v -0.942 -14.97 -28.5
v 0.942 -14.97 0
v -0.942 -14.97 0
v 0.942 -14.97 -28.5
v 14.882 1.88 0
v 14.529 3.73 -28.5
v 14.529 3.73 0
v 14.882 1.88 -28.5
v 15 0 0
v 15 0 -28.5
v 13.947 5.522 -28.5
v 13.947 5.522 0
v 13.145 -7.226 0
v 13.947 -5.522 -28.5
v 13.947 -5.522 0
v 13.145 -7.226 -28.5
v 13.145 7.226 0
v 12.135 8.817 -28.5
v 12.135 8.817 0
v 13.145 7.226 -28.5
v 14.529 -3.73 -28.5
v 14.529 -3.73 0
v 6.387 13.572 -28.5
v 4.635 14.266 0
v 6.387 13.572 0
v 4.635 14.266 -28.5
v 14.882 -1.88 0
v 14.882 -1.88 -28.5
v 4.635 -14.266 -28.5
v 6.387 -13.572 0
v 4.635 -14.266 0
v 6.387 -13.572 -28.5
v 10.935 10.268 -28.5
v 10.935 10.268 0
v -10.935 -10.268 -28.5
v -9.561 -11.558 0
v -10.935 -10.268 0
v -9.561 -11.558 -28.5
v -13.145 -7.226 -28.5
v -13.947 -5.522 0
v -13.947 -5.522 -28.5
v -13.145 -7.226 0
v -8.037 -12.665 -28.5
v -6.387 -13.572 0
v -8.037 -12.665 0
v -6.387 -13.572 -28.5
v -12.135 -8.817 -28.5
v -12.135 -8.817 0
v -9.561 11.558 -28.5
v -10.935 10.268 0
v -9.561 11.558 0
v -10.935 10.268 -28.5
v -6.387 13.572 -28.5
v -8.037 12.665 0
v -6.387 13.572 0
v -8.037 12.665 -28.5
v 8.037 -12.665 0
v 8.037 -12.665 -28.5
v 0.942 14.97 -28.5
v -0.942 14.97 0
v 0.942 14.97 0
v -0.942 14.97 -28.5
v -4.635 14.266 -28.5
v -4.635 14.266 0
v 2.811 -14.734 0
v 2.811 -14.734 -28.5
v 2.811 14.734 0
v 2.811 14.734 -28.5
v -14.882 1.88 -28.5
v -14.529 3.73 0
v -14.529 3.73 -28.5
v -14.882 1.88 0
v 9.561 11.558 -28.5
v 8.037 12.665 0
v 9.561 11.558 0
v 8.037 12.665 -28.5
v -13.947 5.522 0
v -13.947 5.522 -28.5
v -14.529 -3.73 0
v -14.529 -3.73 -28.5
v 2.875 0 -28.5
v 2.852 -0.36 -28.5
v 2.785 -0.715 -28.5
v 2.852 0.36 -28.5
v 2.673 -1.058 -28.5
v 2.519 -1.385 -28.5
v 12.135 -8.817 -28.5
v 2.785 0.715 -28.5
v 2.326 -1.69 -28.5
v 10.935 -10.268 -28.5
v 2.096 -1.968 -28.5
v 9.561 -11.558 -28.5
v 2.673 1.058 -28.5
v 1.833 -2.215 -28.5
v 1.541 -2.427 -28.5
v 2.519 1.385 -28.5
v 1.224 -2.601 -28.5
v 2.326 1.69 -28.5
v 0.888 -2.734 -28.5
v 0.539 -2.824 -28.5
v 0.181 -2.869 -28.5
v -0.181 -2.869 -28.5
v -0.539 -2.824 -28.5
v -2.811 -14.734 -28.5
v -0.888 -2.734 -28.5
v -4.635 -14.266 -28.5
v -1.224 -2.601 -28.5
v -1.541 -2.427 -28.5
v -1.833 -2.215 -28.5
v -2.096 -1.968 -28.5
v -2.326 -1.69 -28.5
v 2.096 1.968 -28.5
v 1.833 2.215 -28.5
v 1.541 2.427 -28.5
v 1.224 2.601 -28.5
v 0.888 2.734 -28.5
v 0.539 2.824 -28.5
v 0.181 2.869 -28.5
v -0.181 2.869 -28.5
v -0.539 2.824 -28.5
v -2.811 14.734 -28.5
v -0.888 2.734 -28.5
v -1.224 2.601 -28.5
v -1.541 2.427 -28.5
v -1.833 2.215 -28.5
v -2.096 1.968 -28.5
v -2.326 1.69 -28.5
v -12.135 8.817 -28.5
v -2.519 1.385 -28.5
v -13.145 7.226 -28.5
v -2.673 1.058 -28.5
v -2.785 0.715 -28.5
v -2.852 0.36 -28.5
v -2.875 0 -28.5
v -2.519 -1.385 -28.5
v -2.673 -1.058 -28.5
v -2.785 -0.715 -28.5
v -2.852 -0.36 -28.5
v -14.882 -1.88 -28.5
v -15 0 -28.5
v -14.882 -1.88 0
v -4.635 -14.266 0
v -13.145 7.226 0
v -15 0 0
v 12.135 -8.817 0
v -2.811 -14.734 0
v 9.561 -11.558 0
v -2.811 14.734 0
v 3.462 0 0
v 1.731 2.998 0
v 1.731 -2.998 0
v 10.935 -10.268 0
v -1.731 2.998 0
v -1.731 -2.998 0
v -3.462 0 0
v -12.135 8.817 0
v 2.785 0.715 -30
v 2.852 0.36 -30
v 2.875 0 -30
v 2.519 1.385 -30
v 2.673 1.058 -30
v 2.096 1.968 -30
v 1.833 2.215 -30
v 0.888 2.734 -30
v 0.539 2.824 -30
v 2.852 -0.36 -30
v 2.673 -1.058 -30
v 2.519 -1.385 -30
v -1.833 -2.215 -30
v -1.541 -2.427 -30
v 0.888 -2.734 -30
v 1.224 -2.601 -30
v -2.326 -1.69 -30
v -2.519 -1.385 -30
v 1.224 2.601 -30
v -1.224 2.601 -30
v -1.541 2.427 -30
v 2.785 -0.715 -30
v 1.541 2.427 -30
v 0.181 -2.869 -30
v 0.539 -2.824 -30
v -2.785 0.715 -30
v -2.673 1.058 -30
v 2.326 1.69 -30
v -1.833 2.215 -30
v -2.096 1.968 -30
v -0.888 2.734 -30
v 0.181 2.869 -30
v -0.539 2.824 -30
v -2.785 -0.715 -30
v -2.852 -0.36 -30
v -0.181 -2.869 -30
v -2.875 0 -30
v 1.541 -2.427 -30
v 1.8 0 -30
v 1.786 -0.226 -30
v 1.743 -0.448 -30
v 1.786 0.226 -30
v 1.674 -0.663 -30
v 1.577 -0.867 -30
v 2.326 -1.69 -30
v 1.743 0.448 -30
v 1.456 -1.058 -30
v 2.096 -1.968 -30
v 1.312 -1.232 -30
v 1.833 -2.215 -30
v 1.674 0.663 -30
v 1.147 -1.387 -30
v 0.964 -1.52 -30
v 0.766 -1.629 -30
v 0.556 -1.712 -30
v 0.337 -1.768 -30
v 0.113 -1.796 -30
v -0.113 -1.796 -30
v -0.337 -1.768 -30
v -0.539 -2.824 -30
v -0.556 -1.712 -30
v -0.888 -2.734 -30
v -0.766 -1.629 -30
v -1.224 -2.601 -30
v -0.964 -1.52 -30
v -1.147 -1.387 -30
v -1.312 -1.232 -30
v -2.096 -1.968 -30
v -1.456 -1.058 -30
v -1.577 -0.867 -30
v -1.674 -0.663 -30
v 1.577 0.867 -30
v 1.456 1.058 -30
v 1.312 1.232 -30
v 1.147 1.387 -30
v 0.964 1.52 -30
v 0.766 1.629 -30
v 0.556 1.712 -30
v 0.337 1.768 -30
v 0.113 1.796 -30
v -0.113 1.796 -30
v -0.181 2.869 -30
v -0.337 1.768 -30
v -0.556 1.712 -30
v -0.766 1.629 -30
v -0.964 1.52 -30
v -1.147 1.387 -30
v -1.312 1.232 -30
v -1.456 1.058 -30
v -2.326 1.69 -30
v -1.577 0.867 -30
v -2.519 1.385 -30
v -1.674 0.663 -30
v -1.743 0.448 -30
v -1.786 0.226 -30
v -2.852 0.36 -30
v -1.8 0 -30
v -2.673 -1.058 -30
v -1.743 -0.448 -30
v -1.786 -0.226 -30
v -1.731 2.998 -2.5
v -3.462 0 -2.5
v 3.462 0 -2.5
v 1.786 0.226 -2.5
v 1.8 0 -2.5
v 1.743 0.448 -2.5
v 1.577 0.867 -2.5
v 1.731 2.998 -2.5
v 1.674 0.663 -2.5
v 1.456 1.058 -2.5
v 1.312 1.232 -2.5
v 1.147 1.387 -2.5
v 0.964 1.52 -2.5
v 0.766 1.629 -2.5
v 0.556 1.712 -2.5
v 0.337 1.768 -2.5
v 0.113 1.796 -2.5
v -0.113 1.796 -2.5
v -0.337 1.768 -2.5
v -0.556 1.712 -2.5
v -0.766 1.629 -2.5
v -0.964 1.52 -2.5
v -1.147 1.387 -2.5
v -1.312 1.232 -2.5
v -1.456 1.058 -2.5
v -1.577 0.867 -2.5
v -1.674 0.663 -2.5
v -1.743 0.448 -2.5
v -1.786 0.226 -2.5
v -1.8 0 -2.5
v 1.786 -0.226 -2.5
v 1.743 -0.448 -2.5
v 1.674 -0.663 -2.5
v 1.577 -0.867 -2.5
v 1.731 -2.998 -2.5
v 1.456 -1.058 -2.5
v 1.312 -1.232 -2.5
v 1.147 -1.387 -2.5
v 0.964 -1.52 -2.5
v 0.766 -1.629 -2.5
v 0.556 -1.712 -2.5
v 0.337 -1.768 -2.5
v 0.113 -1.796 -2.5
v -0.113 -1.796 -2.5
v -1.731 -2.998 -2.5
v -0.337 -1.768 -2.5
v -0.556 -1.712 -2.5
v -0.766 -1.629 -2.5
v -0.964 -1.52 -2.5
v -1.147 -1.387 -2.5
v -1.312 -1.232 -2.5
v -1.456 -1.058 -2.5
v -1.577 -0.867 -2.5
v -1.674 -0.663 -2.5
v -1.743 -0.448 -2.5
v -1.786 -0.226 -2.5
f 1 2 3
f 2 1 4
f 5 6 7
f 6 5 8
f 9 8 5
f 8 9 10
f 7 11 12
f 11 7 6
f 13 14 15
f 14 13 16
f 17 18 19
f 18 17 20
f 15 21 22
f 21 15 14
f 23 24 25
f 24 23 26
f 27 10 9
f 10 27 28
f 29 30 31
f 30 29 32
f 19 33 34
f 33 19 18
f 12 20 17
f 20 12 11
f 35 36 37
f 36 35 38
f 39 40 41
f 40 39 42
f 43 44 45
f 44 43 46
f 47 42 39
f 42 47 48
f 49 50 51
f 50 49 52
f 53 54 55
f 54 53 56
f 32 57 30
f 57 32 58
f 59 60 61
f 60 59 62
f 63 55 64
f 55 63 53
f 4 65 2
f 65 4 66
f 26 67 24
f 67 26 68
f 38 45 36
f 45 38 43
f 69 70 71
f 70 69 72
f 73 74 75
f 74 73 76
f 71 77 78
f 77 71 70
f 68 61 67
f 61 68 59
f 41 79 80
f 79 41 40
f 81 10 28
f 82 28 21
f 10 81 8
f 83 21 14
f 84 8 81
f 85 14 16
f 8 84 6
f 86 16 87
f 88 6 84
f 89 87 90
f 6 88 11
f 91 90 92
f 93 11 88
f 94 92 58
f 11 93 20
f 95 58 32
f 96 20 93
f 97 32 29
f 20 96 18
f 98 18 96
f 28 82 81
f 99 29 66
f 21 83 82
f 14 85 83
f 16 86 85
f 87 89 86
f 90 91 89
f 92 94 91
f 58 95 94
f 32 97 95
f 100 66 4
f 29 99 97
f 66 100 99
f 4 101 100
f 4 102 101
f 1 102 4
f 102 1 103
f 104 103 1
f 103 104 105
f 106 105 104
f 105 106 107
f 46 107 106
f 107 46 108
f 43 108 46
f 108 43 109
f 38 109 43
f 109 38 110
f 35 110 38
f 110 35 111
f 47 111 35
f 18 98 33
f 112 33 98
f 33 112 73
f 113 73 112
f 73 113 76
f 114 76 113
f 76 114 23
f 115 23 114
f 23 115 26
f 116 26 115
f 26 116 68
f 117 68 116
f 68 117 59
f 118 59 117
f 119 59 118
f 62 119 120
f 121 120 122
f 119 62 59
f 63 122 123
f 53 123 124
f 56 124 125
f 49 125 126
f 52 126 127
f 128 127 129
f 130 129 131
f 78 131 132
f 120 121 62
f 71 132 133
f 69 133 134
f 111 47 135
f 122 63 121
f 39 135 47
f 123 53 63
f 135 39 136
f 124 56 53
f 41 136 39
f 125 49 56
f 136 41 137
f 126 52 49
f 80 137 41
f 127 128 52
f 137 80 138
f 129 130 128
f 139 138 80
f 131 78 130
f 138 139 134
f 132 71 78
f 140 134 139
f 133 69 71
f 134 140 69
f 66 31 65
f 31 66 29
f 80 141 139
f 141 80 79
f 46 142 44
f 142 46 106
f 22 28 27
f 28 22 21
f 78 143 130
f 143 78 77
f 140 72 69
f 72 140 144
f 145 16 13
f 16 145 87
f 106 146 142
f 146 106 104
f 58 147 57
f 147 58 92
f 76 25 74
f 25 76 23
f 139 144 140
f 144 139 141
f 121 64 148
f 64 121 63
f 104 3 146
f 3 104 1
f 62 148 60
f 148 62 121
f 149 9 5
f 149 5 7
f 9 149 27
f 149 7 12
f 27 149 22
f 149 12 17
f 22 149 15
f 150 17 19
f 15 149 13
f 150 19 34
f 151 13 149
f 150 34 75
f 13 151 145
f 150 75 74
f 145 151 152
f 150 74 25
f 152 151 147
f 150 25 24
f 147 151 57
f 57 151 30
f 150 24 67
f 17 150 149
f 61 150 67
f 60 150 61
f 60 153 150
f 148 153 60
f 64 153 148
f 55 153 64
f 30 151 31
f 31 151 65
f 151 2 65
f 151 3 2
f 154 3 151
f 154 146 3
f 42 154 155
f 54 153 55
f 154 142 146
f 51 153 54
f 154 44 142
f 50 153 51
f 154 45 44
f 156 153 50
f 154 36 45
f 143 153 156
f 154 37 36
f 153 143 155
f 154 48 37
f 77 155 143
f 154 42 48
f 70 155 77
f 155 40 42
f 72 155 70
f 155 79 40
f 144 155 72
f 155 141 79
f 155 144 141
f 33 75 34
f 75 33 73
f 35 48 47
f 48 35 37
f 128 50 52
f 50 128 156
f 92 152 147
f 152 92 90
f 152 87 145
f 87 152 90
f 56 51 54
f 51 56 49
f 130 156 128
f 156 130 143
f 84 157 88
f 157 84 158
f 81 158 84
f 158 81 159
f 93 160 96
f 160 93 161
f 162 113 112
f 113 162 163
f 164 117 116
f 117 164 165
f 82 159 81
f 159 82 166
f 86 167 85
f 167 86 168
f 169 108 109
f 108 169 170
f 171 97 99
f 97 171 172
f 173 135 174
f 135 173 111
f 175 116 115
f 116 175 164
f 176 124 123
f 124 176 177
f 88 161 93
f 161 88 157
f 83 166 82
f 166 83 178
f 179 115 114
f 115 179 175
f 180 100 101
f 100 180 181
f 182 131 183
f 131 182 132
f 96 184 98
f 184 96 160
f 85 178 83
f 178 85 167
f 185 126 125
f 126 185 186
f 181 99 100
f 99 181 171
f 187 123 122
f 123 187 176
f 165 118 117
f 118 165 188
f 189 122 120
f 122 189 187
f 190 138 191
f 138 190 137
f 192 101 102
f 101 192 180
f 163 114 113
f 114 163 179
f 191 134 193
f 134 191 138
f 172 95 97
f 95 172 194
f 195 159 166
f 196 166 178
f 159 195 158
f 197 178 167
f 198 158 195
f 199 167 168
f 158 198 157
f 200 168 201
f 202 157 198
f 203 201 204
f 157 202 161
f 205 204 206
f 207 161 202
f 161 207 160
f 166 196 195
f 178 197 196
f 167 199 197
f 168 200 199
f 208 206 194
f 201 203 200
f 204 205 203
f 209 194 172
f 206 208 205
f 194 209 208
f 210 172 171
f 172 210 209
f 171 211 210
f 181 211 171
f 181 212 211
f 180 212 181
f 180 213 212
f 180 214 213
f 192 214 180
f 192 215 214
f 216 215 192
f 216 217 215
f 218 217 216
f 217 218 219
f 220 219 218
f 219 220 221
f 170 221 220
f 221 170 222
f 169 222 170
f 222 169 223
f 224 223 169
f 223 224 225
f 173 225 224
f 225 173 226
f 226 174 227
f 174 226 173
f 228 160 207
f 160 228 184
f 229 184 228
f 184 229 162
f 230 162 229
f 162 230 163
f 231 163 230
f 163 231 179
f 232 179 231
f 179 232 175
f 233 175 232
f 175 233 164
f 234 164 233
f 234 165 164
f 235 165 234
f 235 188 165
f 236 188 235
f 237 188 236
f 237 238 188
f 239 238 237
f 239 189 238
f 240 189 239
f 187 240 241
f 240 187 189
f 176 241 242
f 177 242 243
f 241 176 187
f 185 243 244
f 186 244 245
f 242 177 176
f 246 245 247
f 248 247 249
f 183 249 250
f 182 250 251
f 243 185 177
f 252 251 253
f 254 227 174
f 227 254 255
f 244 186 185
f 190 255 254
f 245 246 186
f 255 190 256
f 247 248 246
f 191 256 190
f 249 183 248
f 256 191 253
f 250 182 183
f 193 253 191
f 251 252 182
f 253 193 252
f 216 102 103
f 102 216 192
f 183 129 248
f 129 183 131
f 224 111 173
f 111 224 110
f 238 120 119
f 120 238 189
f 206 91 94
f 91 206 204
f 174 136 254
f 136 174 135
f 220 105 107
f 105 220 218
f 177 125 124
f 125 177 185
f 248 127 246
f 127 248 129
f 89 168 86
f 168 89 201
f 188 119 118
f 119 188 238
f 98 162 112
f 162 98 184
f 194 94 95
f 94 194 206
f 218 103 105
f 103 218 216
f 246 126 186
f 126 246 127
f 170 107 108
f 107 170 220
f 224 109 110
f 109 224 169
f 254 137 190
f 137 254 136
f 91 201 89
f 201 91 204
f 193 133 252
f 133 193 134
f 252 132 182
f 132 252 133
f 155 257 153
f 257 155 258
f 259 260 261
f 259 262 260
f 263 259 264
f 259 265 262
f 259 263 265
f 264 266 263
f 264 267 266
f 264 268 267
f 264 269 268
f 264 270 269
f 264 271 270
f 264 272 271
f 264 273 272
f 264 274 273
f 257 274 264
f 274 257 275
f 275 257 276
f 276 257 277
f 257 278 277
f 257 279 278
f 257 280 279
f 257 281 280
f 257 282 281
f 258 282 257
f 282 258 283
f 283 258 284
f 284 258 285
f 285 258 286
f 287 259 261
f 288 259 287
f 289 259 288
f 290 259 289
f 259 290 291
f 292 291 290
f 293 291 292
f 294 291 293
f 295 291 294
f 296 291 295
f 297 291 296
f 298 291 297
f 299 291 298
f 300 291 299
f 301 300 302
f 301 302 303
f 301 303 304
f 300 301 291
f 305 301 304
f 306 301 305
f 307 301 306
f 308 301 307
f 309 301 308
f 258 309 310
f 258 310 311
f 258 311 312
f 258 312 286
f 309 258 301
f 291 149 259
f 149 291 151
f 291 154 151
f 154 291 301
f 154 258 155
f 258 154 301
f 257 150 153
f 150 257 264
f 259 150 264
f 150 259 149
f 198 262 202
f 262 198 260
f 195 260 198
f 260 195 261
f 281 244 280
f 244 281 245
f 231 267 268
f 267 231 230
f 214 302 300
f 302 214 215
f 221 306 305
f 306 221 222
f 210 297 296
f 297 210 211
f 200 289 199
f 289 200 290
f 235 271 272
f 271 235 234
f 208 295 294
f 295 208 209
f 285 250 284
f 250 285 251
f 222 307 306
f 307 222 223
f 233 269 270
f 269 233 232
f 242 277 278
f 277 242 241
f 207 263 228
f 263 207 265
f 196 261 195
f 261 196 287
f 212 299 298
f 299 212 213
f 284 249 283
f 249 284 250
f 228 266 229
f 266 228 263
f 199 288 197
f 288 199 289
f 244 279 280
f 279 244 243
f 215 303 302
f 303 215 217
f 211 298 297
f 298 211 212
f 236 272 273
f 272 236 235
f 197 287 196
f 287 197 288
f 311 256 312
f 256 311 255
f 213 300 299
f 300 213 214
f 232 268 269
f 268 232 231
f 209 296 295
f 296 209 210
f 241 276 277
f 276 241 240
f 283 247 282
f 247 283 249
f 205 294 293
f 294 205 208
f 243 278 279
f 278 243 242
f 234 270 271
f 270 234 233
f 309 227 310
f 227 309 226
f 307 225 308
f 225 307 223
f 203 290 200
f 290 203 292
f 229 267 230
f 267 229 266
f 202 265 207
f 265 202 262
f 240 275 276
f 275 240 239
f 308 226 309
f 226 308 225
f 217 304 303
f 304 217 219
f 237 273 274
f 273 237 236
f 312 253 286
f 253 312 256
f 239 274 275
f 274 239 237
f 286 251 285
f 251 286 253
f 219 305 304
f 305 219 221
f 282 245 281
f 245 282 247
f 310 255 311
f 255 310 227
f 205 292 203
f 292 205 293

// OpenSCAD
$fn = 50;

difference() {
	union() {
		translate(v = [0, 0, -28.5]) {
			cylinder(h = 28.5, r = 15.0);
		}
		#translate(v = [0, 0, -30.0]) {
			cylinder(h = 30, r = 2.875);
		}
	}
	union() {
		translate(v = [0, 0, 0]) {
			rotate(a = [0, 0, 0]) {
				difference() {
					union() {
						translate(v = [0, 0, -2.5]) {
							linear_extrude(height = 2.5) {
								polygon(points = [[3.4619999999999997, 0.0], [1.7310000000000003, 2.9981799479017264], [-1.7309999999999992, 2.9981799479017264], [-3.4619999999999997, 4.2397272186481365e-16], [-1.7310000000000014, -2.998179947901726], [1.7309999999999977, -2.9981799479017277]]);
							}
						}
					}
					union();
				}
			}
		}
		#translate(v = [0, 0, -100.0]) {
			cylinder(h = 200, r = 1.8);
		}
	}
}
